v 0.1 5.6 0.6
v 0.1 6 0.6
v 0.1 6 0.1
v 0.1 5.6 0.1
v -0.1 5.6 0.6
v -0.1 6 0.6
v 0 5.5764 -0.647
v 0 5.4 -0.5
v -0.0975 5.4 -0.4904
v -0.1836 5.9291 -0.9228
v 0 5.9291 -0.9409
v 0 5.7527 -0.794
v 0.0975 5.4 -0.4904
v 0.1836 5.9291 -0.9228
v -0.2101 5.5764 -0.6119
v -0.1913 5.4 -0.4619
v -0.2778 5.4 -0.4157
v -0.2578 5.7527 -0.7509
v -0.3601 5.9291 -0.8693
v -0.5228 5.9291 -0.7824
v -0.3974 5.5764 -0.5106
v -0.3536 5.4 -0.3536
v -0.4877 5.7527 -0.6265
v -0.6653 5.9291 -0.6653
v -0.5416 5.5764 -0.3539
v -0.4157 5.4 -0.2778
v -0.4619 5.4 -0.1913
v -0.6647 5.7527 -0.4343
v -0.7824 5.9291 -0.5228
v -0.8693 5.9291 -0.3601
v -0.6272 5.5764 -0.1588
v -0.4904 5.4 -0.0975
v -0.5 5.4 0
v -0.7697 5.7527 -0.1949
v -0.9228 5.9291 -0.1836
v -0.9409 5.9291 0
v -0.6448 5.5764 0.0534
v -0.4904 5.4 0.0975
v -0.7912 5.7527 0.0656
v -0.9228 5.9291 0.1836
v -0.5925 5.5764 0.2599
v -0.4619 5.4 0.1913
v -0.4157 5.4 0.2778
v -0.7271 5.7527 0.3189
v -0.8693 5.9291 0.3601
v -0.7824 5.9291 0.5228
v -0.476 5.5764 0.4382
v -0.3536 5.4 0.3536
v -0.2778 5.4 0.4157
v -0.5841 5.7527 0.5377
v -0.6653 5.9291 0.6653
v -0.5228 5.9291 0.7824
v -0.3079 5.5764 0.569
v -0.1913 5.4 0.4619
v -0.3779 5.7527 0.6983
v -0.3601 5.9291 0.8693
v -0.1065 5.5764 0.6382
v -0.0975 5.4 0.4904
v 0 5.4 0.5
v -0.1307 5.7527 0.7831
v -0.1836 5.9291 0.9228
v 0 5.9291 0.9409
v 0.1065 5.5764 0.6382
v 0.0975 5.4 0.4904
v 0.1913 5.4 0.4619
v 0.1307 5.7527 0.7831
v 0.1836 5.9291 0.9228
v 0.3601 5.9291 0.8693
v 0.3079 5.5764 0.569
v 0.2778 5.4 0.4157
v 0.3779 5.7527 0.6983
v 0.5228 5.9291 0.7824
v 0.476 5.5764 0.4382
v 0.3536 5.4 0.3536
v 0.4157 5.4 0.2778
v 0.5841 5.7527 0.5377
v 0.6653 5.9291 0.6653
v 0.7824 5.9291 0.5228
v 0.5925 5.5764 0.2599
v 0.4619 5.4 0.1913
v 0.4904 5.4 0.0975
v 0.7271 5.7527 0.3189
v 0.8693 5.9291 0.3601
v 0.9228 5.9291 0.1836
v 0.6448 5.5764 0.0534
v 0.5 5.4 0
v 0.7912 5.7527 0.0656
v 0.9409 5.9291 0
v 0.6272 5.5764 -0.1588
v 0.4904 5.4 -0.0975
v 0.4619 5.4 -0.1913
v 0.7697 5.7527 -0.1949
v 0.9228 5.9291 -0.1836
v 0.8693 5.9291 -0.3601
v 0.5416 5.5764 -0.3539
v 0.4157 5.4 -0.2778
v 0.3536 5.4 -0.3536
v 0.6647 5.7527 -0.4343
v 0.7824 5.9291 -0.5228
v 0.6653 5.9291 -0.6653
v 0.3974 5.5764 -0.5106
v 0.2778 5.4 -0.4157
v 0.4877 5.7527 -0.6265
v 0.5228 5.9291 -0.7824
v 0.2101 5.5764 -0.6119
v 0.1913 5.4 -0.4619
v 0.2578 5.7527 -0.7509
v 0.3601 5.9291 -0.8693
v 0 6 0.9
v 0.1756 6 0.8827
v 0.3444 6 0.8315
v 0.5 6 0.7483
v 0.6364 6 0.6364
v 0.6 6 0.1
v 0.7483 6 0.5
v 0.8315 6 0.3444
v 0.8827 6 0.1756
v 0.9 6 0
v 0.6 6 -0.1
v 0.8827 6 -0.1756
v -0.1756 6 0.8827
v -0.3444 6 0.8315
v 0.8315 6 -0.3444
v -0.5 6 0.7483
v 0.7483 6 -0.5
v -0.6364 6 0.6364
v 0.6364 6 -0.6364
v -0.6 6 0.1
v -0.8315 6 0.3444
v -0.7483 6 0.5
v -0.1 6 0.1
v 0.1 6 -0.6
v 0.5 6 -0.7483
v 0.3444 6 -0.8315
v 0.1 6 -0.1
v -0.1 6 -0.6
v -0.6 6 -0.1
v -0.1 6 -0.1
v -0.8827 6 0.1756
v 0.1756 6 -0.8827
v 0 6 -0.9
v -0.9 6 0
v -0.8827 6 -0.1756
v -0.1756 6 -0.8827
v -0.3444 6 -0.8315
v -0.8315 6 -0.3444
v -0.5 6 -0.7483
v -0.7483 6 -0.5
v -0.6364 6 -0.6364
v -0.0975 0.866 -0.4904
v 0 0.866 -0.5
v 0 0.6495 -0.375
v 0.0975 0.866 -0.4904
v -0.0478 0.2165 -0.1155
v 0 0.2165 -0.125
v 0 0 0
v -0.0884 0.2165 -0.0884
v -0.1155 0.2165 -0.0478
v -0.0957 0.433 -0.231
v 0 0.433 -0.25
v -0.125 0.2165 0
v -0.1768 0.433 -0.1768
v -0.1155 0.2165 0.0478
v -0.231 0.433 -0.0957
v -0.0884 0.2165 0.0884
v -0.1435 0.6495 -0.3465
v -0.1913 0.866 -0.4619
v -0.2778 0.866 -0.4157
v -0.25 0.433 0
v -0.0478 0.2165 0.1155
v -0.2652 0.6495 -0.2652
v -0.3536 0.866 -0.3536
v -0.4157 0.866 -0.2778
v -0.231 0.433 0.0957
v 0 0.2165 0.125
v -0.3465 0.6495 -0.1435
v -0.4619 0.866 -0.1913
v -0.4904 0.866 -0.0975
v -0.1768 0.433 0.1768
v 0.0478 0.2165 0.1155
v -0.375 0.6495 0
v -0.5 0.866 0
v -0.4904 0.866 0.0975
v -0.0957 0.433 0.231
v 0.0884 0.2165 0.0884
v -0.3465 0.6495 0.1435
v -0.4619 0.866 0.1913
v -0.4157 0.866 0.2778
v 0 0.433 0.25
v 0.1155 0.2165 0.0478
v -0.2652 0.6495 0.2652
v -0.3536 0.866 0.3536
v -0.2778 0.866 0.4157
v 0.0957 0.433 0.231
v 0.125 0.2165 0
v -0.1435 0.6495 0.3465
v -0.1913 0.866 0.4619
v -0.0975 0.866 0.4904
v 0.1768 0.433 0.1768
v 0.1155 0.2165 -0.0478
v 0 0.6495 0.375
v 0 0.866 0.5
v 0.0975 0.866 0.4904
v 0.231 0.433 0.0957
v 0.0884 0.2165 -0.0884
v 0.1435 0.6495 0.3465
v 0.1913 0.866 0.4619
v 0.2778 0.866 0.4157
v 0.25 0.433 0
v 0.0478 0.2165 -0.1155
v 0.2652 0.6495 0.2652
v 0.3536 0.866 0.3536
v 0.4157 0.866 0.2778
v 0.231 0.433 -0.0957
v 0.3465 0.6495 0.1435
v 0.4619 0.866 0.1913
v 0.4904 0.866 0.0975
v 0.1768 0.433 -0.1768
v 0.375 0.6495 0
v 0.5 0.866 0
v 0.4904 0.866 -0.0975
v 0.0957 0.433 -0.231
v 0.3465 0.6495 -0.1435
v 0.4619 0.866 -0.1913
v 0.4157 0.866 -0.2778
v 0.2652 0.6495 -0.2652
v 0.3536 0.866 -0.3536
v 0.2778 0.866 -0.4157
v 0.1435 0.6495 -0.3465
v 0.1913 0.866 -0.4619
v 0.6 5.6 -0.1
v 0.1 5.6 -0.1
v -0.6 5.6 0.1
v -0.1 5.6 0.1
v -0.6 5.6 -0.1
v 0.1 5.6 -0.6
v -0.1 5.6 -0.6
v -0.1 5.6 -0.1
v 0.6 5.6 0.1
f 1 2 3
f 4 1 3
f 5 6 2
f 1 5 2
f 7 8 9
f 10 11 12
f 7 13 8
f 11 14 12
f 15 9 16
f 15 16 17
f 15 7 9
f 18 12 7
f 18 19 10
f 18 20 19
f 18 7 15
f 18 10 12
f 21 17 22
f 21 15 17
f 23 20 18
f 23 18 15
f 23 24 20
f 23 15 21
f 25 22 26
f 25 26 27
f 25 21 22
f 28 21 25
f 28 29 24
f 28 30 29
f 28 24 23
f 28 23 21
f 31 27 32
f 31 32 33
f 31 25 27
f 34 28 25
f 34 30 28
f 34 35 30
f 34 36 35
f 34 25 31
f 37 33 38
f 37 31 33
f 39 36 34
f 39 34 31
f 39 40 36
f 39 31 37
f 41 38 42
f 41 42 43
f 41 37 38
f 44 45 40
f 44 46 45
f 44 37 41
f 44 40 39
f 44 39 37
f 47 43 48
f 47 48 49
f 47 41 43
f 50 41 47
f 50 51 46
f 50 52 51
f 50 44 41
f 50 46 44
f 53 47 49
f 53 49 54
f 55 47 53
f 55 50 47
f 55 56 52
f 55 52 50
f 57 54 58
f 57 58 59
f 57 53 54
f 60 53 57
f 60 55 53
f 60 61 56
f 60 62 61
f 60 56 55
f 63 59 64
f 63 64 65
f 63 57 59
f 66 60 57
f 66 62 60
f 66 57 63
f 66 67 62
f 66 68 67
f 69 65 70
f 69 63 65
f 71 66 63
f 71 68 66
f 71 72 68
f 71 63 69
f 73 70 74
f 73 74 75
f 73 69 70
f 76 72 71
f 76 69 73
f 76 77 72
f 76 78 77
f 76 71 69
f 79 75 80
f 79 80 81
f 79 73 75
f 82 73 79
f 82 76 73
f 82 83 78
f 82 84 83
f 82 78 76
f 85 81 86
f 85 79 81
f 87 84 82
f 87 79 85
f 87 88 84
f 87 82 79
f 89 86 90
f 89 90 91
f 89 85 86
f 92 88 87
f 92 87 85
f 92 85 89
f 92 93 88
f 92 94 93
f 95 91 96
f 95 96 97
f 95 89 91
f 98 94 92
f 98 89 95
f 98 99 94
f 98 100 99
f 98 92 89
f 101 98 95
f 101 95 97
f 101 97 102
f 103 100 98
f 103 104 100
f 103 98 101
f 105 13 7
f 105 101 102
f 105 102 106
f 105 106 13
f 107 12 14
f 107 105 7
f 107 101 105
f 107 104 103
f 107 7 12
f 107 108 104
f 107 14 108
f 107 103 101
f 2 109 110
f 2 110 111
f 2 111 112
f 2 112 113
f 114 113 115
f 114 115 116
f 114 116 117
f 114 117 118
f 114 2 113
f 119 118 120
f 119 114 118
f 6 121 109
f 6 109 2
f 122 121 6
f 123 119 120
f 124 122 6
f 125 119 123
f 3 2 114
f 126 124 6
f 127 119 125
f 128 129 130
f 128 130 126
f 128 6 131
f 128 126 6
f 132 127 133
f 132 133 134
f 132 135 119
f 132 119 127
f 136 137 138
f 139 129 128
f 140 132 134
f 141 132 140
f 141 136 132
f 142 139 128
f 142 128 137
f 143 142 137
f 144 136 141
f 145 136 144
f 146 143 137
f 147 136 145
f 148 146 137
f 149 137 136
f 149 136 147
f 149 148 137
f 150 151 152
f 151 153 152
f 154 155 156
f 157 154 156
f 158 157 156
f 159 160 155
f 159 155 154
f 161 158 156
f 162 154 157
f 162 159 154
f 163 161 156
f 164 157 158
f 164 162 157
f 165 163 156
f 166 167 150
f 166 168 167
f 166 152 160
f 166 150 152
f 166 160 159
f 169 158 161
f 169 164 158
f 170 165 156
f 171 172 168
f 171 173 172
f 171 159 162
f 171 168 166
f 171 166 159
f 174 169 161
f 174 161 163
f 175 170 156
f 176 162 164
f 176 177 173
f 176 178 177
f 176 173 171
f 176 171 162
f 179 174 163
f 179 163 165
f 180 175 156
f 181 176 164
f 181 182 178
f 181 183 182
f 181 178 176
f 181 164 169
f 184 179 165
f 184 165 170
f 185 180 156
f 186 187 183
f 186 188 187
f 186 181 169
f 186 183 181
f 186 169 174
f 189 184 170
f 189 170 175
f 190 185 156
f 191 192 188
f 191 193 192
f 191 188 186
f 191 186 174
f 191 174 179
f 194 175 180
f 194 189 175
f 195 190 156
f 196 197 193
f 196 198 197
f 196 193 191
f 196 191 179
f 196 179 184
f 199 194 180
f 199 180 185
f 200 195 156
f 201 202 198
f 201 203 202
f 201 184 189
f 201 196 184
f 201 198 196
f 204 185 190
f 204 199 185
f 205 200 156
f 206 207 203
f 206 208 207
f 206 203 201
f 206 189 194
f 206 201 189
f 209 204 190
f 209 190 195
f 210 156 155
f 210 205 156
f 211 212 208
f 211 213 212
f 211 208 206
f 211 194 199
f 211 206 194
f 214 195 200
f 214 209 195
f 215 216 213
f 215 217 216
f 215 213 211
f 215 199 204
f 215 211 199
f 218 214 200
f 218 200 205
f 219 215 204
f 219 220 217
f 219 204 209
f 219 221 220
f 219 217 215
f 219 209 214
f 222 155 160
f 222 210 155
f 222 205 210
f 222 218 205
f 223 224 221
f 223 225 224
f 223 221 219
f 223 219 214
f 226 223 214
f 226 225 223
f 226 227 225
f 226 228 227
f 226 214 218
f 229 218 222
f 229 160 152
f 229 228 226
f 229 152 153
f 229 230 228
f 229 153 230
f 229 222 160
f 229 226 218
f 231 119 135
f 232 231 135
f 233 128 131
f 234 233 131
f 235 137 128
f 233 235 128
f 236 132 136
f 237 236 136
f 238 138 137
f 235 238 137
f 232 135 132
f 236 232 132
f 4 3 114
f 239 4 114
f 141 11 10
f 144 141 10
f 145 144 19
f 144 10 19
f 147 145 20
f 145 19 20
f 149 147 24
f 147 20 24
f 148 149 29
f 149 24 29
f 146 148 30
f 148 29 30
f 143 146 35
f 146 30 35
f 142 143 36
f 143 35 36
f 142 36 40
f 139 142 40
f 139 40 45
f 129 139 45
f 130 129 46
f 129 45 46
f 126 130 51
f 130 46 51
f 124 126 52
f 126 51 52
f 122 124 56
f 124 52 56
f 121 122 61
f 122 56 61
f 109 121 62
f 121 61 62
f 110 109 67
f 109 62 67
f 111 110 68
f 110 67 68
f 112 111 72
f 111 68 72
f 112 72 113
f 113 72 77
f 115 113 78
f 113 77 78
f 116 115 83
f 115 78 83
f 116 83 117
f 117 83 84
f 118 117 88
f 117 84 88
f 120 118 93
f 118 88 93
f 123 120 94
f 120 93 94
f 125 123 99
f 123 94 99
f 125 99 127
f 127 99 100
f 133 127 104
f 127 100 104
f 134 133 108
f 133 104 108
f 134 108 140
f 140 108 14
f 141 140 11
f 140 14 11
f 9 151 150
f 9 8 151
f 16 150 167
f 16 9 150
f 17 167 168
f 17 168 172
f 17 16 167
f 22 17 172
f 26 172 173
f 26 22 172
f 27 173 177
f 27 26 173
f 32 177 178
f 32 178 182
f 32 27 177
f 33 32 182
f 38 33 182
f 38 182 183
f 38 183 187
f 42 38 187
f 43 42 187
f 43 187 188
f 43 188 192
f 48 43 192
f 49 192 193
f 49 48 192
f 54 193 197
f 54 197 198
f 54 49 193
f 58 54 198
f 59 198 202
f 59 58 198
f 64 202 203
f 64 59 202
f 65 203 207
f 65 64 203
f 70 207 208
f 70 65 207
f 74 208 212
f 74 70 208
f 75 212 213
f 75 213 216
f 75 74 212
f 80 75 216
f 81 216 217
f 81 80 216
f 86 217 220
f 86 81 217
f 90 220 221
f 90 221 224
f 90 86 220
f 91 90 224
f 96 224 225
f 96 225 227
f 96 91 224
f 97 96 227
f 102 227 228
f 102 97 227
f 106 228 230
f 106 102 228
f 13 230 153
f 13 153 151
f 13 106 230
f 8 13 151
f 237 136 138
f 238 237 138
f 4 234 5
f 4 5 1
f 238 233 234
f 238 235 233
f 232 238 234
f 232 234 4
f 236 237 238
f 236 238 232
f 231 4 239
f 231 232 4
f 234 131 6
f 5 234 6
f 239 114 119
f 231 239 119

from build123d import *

# Parameters (mm, degrees)
CHAMFER_1_SIZE      = 0.1
CHAMFER_1_SIZE2     = 0.092274999
CUT_EXTRUDE_1_DEPTH = 0.4


with BuildPart() as part:
    # 草图1 → 旋转1 (revolve)
    with BuildSketch(Plane.XY, mode=Mode.PRIVATE) as revolve_1_sk:
        Polygon((0, 0), (0.5, 0.866025404), (0.5, 5.4), (1, 6), (0, 6), align=None)
    revolve(revolve_1_sk.sketch.rotate(Axis((0, 0, 0), (0, 1, 0)), 90), axis=Axis((0, 0, 0), (0, 1, 0)))

    # 倒角1
    chamfer_1_edges = [part.edges().sort_by_distance(p)[0] for p in [
        (0, 6, 1),
    ]]
    chamfer_1_side = [part.faces().sort_by_distance(p)[0] for p in [
        (0, 6, 0),
    ]]
    chamfer(chamfer_1_edges, length=CHAMFER_1_SIZE, length2=CHAMFER_1_SIZE2, reference=chamfer_1_side[0])

    # 草图2 → 切除-拉伸1 (cut)
    with BuildSketch(Plane(origin=(0, 6, 0), x_dir=(1, 0, 0), z_dir=(0, 1, 0))):
        Polygon((-0.6, -0.1), (-0.1, -0.1), (-0.1, -0.6), (0.1, -0.6), (0.1, -0.1), (0.6, -0.1), (0.6, 0.1), (0.1, 0.1), (0.1, 0.6), (-0.1, 0.6), (-0.1, 0.1), (-0.6, 0.1), align=None)
    extrude(amount=-CUT_EXTRUDE_1_DEPTH, mode=Mode.SUBTRACT)


solid = part.part
